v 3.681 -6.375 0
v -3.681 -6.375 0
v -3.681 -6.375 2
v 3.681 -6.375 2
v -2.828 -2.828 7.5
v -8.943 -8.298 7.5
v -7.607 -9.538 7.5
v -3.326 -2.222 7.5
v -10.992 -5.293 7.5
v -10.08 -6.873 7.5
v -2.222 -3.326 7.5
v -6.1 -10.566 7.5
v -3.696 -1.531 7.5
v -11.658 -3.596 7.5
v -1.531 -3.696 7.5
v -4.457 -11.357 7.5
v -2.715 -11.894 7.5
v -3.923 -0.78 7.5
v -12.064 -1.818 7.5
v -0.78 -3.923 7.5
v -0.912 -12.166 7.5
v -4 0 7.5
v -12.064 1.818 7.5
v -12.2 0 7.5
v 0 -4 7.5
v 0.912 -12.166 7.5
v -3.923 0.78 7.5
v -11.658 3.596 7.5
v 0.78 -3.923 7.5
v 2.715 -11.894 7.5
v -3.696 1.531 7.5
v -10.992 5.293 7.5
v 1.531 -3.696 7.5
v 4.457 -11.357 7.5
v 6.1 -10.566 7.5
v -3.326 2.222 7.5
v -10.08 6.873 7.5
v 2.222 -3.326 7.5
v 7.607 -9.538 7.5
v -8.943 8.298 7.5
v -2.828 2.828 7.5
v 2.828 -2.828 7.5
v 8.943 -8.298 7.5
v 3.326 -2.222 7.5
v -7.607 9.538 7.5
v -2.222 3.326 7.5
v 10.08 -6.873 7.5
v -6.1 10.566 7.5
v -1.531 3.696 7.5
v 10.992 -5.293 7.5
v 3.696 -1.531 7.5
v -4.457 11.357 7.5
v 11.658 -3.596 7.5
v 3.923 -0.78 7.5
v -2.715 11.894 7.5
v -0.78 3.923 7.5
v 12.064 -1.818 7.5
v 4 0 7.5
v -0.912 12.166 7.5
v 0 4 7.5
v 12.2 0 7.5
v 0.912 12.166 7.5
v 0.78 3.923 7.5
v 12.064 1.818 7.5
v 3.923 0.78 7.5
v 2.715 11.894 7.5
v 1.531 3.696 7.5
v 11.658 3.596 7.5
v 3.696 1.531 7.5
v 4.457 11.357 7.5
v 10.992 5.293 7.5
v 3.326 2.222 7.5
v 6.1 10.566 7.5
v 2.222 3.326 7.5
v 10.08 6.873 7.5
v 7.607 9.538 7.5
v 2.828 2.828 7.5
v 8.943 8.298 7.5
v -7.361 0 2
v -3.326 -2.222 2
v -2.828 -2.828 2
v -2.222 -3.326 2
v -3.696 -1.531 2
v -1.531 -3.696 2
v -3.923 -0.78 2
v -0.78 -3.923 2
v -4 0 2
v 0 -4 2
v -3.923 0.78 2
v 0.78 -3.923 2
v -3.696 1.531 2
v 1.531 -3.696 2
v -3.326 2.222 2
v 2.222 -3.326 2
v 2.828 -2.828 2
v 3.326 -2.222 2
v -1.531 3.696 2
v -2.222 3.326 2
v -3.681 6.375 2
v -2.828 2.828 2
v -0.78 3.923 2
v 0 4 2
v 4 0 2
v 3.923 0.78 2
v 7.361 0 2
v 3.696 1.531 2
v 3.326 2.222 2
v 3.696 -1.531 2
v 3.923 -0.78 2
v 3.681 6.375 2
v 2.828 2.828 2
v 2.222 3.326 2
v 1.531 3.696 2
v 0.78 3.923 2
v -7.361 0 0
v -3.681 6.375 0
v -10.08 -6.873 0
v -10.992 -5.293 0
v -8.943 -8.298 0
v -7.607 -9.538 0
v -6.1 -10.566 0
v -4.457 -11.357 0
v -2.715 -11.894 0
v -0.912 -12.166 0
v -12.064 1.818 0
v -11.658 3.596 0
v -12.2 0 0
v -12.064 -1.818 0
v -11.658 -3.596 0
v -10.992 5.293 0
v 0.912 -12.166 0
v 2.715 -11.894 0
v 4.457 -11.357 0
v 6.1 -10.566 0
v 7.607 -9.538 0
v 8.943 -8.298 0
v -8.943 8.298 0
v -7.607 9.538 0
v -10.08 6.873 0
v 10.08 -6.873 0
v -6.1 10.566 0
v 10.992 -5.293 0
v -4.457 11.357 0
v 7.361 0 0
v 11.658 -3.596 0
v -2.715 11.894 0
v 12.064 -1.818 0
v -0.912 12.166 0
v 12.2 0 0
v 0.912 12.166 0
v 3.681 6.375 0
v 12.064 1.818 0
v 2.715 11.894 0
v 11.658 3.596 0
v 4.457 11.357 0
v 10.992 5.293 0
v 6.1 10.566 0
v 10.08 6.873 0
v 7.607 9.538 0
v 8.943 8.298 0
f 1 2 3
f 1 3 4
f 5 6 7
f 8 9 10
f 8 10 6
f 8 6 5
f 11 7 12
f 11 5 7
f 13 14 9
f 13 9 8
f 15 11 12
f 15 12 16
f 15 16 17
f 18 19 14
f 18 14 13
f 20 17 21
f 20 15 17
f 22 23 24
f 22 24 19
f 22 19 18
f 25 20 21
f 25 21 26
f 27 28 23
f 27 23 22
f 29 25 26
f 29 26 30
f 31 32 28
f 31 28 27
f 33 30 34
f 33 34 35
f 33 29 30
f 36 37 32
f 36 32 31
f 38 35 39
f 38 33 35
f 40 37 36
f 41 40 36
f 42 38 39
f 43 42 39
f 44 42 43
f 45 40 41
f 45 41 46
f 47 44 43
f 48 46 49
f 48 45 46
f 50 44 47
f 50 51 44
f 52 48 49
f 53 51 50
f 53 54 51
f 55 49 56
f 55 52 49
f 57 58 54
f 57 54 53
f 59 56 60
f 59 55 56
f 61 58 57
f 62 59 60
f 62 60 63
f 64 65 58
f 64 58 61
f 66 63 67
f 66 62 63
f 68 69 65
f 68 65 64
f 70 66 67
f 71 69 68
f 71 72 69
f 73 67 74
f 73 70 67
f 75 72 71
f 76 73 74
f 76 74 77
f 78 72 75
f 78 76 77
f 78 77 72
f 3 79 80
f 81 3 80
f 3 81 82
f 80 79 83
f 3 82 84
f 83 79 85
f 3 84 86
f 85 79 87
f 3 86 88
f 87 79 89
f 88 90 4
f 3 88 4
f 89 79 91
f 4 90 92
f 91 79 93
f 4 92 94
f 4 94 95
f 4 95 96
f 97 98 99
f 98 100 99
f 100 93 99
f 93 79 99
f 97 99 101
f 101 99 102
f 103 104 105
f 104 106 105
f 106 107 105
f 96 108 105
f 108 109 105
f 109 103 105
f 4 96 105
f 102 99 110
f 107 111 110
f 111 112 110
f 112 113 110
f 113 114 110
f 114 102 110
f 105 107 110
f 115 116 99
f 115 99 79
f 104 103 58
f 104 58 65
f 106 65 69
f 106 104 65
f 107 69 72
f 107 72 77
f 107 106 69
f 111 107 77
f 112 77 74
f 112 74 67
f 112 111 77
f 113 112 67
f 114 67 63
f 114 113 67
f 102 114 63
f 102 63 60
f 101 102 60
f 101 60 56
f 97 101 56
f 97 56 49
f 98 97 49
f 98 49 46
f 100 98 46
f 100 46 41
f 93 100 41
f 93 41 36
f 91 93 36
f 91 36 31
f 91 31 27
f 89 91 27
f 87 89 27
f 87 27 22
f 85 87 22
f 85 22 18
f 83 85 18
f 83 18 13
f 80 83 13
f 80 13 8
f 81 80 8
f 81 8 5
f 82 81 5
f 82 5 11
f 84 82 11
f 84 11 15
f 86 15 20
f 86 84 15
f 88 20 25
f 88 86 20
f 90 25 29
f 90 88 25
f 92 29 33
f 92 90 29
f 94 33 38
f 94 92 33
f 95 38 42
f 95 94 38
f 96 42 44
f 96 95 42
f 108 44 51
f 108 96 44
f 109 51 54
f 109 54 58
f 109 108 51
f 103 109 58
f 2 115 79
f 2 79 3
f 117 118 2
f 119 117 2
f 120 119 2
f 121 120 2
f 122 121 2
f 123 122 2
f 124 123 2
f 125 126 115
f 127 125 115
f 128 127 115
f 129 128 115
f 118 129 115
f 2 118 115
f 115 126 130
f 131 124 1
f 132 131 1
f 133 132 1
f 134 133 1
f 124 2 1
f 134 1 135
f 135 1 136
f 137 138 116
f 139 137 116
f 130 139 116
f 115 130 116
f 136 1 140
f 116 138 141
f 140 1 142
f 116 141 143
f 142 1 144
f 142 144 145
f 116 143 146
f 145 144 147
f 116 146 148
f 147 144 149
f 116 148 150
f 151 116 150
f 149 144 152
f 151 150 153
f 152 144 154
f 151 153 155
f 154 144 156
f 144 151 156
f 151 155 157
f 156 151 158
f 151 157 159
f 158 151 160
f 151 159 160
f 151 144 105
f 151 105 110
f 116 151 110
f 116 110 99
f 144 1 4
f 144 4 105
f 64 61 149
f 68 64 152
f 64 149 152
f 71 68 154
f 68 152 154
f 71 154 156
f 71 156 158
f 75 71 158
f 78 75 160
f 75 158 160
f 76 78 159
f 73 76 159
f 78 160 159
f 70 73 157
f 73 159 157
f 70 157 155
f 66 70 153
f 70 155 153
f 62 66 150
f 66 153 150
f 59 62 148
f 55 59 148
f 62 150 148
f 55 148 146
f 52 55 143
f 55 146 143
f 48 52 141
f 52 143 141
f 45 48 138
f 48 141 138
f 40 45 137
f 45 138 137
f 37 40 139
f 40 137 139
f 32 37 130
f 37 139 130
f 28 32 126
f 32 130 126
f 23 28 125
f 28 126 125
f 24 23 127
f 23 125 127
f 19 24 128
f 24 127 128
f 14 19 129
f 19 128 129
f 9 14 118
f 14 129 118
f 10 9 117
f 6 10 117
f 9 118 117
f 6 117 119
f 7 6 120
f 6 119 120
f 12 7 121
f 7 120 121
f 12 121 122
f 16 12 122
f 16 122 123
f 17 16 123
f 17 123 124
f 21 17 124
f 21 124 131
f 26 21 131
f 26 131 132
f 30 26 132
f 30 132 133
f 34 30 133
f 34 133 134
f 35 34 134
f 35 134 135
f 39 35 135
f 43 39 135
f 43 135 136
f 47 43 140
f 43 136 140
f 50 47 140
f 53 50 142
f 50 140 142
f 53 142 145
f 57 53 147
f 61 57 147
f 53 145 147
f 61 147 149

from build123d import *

# Parameters (mm, degrees)
F0_R     = 12.2
F0_R_2   = 4
F1_DEPTH = 7.5
F2_DEPTH = 2


with BuildPart() as f1:
    # F0 (on Top) → F1 (new body)
    with BuildSketch(Plane.XY):
        Circle(F0_R)
        Polygon((7.361216, 0), (3.680608, -6.375), (-3.680608, -6.375), (-7.361216, 0), (-3.680608, 6.375), (3.680608, 6.375), align=None, mode=Mode.SUBTRACT)
        Polygon((-3.680608, -6.375), (3.680608, -6.375), (7.361216, 0), (3.680608, 6.375), (-3.680608, 6.375), (-7.361216, 0), align=None)
        Circle(F0_R_2, mode=Mode.SUBTRACT)
    extrude(amount=F1_DEPTH)

    # F0 (on Top) → F2 (cut)
    with BuildSketch(Plane.XY):
        Circle(F0_R_2)
        Polygon((-3.680608, -6.375), (3.680608, -6.375), (7.361216, 0), (3.680608, 6.375), (-3.680608, 6.375), (-7.361216, 0), align=None)
        Circle(F0_R_2, mode=Mode.SUBTRACT)
    extrude(amount=F2_DEPTH, mode=Mode.SUBTRACT)


solid = f1.part
